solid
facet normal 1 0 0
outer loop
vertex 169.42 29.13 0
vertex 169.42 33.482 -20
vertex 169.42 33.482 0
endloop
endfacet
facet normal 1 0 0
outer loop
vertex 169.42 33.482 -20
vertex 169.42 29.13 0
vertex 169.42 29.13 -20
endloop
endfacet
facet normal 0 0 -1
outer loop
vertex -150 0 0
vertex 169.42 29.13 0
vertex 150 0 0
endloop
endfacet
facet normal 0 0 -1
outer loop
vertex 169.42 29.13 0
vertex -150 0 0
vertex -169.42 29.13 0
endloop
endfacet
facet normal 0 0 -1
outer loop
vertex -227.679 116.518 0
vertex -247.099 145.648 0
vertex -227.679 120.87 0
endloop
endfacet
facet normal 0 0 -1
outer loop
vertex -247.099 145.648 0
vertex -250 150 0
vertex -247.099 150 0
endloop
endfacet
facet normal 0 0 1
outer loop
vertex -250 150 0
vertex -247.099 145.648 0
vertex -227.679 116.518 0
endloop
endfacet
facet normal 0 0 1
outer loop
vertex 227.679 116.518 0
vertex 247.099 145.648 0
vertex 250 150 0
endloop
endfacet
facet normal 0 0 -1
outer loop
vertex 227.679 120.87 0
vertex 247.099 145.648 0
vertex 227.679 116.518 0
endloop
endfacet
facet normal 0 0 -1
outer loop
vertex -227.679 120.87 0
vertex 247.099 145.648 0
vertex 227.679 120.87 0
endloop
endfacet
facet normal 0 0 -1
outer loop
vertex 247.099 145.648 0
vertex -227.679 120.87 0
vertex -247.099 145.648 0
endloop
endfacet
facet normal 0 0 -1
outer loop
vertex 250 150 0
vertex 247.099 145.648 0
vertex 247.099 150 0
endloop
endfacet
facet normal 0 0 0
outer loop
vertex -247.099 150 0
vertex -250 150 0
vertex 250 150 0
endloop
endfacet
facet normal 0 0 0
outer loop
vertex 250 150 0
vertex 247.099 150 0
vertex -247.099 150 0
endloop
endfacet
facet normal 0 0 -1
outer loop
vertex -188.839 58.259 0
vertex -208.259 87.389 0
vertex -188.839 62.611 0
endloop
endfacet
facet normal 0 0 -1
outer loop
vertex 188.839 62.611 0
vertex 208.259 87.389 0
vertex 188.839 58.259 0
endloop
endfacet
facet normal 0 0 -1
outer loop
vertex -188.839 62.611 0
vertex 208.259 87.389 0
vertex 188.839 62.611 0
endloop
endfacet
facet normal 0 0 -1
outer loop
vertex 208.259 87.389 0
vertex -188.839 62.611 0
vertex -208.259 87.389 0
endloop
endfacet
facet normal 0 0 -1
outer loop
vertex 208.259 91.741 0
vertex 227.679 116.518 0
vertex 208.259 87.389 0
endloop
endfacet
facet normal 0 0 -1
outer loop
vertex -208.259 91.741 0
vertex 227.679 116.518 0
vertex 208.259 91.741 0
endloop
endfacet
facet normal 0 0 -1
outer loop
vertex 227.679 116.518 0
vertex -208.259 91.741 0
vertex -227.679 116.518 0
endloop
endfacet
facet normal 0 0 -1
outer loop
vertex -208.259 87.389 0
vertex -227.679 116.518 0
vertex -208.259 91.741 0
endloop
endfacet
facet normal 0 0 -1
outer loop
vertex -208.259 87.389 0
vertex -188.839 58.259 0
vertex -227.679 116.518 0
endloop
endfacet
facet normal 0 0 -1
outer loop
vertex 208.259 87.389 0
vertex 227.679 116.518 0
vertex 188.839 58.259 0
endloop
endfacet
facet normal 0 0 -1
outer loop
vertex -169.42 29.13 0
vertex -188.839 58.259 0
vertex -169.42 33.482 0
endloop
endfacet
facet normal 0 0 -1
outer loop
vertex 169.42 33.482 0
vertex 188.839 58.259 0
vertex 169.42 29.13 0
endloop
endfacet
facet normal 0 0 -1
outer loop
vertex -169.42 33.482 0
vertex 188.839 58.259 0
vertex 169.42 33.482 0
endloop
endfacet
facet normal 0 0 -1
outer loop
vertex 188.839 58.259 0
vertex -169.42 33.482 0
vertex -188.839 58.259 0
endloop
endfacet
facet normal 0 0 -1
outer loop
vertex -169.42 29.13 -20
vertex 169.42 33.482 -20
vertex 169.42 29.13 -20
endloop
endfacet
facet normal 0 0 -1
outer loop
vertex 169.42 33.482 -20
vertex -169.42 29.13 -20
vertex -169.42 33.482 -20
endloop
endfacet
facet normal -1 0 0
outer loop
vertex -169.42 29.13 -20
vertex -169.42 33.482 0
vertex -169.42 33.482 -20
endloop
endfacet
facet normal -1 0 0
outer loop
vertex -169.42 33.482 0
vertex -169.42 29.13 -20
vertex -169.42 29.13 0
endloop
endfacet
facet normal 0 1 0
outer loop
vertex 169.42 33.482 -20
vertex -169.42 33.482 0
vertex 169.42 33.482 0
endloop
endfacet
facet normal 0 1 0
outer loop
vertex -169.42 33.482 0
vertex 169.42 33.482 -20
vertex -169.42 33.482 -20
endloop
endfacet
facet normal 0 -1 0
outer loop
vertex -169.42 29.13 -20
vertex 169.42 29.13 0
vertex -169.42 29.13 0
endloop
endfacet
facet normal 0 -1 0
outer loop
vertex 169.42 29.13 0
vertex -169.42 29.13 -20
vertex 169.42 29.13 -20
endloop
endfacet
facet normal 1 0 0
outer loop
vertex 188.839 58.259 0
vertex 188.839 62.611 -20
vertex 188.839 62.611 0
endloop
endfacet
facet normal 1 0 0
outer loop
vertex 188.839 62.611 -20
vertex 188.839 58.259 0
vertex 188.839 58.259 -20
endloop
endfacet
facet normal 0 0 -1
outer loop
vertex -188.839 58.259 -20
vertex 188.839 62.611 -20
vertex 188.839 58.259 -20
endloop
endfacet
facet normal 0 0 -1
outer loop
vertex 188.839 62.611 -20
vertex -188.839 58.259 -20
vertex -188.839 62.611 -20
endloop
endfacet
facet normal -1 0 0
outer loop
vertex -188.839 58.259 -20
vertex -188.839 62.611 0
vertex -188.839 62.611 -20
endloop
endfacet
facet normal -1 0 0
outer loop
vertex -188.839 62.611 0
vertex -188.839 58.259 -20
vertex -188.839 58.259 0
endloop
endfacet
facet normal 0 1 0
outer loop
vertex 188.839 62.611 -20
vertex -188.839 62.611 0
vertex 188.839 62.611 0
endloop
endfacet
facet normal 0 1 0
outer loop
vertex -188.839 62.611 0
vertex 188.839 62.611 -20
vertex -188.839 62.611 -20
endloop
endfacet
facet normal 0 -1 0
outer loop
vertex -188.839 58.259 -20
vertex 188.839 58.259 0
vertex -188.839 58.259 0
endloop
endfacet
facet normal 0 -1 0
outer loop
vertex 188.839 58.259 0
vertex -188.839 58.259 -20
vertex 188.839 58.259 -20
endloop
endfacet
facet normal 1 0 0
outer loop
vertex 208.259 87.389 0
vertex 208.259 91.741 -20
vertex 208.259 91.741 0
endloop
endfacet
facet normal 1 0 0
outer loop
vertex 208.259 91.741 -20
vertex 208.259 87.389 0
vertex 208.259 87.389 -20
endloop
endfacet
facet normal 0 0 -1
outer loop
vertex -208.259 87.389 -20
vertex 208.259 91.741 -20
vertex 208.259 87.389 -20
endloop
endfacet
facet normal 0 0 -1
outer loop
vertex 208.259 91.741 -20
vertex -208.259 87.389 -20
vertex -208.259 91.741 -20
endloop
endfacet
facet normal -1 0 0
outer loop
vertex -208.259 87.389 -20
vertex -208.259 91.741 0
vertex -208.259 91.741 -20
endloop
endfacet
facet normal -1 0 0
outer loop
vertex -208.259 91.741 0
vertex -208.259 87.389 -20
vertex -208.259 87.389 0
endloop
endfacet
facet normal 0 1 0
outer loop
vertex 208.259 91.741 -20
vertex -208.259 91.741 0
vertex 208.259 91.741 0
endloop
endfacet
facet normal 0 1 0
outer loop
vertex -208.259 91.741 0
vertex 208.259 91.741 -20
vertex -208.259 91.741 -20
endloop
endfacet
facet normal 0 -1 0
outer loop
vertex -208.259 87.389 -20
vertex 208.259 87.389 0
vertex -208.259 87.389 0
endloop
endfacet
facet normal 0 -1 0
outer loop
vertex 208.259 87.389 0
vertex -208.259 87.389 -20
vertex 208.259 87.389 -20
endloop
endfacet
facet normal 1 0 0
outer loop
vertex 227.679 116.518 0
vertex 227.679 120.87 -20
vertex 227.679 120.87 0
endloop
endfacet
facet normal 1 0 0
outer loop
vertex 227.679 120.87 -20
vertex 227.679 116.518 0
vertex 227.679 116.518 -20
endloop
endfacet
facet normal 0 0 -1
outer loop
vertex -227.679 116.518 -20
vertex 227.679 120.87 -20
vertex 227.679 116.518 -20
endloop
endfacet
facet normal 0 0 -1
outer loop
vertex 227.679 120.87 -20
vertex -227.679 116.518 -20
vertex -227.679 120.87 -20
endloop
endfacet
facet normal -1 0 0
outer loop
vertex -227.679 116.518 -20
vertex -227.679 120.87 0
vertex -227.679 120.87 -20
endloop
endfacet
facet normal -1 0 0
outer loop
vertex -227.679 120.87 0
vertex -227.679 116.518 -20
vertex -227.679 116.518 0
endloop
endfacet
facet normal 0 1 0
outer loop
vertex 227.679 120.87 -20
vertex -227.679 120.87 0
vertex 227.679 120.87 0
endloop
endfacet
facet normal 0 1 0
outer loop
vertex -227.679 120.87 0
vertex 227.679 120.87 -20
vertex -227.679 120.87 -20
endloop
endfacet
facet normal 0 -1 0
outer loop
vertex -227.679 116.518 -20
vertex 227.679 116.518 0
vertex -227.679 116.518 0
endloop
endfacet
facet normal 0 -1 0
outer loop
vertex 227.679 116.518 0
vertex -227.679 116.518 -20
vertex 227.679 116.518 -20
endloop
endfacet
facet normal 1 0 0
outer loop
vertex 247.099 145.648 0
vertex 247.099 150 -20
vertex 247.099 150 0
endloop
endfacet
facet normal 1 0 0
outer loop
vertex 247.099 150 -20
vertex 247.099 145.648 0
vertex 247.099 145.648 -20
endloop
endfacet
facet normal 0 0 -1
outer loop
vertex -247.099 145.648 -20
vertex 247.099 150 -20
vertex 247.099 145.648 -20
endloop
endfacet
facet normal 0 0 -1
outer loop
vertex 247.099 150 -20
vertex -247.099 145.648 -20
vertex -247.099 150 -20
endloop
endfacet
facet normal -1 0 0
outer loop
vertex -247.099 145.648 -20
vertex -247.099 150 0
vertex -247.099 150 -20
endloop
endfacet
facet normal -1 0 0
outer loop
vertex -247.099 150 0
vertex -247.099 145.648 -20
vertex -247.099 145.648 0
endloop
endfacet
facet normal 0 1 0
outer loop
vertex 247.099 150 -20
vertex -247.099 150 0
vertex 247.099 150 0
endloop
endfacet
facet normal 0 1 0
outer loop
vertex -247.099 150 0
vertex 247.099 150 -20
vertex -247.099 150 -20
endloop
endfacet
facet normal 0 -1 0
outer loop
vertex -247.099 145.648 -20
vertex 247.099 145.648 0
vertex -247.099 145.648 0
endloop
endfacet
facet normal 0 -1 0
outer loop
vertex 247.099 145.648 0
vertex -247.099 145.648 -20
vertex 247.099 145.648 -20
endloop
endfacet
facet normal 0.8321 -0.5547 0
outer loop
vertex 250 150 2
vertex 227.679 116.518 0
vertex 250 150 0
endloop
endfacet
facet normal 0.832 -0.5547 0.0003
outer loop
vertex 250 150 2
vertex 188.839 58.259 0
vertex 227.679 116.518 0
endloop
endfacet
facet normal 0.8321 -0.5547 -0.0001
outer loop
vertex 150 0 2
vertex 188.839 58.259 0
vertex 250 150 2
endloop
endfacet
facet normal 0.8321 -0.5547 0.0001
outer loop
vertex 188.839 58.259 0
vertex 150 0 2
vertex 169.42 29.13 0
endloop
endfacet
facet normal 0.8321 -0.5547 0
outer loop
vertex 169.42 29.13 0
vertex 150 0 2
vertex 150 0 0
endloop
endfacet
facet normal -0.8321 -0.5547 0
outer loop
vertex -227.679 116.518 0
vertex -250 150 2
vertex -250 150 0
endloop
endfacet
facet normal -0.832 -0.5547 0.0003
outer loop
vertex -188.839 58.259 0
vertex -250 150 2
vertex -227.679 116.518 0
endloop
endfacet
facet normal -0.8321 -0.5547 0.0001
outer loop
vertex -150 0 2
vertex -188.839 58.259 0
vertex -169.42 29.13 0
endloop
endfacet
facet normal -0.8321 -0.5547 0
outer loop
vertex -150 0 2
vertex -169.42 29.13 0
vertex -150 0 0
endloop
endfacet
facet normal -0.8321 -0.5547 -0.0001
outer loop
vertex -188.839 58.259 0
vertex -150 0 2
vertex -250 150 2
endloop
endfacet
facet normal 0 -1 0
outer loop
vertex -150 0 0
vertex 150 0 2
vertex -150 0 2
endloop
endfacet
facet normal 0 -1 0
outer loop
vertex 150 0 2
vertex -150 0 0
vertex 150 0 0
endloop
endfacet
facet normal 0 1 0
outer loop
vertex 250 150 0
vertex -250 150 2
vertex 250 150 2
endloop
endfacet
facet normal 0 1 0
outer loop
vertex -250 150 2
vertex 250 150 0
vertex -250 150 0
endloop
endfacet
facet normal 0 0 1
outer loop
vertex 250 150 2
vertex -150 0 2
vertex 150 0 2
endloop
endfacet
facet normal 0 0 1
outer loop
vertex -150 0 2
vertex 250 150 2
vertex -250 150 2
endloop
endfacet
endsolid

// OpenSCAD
module quarter(top_w = 300, bottom_w=500, l=150) 
{
    metal_thickness = 2;
    n_horizontal_beams = 5;
    horizontal_beam_w = 1.7 * 2.56;
    horizontal_beam_h = 20;
    
    points = [[-top_w/2, 0], [top_w/2, 0], [bottom_w/2, l], [-bottom_w/2, l]];
    
    linear_extrude(height = metal_thickness, center = false)
        polygon(points, convexity = 1);
    
    mystep = (l-horizontal_beam_w)/n_horizontal_beams;
    coeff = (bottom_w-top_w)/l;
    for (x = [mystep:mystep:l]) {
        translate([0,x+horizontal_beam_w/2,-horizontal_beam_h/2])
            cube([top_w+x*coeff, horizontal_beam_w, horizontal_beam_h], center=true);
     }
    
}

quarter();
